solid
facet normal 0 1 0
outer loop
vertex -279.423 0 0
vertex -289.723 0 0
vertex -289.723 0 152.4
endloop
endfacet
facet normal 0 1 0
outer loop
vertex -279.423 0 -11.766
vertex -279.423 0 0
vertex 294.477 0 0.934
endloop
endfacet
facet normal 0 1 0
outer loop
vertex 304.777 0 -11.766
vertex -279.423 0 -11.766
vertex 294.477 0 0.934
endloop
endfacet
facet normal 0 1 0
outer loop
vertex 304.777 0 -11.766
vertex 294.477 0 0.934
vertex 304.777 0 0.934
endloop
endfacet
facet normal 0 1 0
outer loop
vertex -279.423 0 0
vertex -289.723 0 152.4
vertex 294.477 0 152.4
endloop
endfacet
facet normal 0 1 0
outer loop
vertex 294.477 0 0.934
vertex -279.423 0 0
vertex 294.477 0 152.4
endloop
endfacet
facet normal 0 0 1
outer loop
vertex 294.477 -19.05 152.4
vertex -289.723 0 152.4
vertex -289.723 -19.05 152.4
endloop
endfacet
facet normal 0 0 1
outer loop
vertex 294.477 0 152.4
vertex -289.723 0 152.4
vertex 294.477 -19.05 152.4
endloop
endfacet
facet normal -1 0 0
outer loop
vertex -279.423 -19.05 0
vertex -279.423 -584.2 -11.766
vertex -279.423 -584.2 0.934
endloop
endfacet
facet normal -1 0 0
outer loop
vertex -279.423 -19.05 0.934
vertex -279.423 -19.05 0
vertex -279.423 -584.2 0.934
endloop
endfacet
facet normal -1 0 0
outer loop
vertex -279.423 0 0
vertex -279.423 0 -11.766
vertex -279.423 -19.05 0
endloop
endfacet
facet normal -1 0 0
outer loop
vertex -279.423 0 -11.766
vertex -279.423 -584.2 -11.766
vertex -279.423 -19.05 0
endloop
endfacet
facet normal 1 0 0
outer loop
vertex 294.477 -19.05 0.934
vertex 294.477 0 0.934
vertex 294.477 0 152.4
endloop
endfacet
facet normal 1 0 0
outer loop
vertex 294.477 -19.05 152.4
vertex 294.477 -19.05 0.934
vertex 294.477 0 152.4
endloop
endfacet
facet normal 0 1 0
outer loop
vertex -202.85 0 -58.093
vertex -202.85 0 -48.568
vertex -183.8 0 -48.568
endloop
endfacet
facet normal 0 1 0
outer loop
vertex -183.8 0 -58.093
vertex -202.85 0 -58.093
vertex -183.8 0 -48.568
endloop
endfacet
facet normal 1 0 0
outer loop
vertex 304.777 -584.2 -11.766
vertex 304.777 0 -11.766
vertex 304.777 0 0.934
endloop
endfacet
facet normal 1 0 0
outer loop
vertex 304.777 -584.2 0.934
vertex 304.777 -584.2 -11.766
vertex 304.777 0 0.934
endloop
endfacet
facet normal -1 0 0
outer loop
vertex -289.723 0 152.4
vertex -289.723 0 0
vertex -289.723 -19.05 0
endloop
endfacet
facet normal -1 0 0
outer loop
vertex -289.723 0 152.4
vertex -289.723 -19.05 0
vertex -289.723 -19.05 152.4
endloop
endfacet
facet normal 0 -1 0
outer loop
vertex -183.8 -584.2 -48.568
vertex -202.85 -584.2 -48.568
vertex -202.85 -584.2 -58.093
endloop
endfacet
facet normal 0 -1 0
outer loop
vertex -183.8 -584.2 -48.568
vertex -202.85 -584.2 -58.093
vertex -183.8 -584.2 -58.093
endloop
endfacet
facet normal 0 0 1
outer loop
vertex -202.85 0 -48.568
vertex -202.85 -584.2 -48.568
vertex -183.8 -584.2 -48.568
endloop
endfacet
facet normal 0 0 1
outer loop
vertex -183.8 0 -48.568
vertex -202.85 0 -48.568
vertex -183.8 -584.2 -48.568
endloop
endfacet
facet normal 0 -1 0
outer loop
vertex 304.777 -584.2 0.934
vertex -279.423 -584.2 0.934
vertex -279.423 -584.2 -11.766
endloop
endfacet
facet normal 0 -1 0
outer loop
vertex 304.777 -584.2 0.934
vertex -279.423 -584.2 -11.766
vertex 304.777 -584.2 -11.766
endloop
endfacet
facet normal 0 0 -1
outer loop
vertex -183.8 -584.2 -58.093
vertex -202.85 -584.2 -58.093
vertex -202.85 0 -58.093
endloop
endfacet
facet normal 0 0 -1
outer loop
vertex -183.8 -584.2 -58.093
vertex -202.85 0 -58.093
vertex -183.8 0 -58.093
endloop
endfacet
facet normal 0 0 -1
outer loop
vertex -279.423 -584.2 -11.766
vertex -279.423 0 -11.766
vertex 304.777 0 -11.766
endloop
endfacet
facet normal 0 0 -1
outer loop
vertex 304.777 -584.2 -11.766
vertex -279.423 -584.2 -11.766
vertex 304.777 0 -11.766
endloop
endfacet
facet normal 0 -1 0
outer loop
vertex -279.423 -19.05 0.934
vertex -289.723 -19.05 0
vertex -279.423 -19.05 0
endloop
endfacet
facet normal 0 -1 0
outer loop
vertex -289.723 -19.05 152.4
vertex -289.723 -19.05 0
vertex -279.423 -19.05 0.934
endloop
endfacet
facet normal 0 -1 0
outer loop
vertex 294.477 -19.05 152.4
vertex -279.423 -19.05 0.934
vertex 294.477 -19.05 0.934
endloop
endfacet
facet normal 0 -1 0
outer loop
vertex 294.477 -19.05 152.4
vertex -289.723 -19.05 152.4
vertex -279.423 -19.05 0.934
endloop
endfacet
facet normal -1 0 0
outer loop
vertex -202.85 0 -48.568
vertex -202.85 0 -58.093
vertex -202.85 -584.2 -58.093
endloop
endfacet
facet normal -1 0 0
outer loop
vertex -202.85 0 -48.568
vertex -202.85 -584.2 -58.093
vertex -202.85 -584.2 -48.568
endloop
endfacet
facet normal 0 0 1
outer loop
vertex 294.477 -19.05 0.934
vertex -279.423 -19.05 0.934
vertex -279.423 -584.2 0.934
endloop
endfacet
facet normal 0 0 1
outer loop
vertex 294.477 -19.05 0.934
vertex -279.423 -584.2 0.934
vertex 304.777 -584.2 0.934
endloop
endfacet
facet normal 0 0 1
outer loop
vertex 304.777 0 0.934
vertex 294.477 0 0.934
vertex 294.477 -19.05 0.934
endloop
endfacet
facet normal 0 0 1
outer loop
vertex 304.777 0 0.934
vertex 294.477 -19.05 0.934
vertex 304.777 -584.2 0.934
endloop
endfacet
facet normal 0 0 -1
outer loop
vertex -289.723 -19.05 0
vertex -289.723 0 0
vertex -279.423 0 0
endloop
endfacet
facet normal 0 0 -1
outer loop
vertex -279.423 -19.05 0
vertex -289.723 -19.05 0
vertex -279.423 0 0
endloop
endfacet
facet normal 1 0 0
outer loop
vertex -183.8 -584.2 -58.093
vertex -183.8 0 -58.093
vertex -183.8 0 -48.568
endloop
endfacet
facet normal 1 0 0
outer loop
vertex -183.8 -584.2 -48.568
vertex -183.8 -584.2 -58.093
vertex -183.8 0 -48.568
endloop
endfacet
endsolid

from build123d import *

# Parameters (mm, degrees)
F1_W     = 19.05
F1_H     = 9.525
F2_DEPTH = 584.2
F0_W     = 584.2
F0_H     = 12.7
F3_DEPTH = 584.2
F4_W     = 584.2
F4_H     = 152.4
F5_DEPTH = 19.05


with BuildPart() as f2:
    # F1 (on Front) → F2 (new body)
    with BuildSketch(Plane.XZ):
        with Locations((-193.325251, -53.330537)):
            Rectangle(F1_W, F1_H)
    extrude(amount=F2_DEPTH)


with BuildPart() as f3:
    # F0 (on Front) → F3 (new body)
    with BuildSketch(Plane.XZ):
        with Locations((12.677219, -5.41553)):
            Rectangle(F0_W, F0_H)
    extrude(amount=F3_DEPTH)

    # F4 (on Front) → F5 (join)
    with BuildSketch(Plane.XZ):
        with Locations((2.377348, 76.2)):
            Rectangle(F4_W, F4_H)
    extrude(amount=F5_DEPTH)


solid = Compound([f2.part, f3.part])
